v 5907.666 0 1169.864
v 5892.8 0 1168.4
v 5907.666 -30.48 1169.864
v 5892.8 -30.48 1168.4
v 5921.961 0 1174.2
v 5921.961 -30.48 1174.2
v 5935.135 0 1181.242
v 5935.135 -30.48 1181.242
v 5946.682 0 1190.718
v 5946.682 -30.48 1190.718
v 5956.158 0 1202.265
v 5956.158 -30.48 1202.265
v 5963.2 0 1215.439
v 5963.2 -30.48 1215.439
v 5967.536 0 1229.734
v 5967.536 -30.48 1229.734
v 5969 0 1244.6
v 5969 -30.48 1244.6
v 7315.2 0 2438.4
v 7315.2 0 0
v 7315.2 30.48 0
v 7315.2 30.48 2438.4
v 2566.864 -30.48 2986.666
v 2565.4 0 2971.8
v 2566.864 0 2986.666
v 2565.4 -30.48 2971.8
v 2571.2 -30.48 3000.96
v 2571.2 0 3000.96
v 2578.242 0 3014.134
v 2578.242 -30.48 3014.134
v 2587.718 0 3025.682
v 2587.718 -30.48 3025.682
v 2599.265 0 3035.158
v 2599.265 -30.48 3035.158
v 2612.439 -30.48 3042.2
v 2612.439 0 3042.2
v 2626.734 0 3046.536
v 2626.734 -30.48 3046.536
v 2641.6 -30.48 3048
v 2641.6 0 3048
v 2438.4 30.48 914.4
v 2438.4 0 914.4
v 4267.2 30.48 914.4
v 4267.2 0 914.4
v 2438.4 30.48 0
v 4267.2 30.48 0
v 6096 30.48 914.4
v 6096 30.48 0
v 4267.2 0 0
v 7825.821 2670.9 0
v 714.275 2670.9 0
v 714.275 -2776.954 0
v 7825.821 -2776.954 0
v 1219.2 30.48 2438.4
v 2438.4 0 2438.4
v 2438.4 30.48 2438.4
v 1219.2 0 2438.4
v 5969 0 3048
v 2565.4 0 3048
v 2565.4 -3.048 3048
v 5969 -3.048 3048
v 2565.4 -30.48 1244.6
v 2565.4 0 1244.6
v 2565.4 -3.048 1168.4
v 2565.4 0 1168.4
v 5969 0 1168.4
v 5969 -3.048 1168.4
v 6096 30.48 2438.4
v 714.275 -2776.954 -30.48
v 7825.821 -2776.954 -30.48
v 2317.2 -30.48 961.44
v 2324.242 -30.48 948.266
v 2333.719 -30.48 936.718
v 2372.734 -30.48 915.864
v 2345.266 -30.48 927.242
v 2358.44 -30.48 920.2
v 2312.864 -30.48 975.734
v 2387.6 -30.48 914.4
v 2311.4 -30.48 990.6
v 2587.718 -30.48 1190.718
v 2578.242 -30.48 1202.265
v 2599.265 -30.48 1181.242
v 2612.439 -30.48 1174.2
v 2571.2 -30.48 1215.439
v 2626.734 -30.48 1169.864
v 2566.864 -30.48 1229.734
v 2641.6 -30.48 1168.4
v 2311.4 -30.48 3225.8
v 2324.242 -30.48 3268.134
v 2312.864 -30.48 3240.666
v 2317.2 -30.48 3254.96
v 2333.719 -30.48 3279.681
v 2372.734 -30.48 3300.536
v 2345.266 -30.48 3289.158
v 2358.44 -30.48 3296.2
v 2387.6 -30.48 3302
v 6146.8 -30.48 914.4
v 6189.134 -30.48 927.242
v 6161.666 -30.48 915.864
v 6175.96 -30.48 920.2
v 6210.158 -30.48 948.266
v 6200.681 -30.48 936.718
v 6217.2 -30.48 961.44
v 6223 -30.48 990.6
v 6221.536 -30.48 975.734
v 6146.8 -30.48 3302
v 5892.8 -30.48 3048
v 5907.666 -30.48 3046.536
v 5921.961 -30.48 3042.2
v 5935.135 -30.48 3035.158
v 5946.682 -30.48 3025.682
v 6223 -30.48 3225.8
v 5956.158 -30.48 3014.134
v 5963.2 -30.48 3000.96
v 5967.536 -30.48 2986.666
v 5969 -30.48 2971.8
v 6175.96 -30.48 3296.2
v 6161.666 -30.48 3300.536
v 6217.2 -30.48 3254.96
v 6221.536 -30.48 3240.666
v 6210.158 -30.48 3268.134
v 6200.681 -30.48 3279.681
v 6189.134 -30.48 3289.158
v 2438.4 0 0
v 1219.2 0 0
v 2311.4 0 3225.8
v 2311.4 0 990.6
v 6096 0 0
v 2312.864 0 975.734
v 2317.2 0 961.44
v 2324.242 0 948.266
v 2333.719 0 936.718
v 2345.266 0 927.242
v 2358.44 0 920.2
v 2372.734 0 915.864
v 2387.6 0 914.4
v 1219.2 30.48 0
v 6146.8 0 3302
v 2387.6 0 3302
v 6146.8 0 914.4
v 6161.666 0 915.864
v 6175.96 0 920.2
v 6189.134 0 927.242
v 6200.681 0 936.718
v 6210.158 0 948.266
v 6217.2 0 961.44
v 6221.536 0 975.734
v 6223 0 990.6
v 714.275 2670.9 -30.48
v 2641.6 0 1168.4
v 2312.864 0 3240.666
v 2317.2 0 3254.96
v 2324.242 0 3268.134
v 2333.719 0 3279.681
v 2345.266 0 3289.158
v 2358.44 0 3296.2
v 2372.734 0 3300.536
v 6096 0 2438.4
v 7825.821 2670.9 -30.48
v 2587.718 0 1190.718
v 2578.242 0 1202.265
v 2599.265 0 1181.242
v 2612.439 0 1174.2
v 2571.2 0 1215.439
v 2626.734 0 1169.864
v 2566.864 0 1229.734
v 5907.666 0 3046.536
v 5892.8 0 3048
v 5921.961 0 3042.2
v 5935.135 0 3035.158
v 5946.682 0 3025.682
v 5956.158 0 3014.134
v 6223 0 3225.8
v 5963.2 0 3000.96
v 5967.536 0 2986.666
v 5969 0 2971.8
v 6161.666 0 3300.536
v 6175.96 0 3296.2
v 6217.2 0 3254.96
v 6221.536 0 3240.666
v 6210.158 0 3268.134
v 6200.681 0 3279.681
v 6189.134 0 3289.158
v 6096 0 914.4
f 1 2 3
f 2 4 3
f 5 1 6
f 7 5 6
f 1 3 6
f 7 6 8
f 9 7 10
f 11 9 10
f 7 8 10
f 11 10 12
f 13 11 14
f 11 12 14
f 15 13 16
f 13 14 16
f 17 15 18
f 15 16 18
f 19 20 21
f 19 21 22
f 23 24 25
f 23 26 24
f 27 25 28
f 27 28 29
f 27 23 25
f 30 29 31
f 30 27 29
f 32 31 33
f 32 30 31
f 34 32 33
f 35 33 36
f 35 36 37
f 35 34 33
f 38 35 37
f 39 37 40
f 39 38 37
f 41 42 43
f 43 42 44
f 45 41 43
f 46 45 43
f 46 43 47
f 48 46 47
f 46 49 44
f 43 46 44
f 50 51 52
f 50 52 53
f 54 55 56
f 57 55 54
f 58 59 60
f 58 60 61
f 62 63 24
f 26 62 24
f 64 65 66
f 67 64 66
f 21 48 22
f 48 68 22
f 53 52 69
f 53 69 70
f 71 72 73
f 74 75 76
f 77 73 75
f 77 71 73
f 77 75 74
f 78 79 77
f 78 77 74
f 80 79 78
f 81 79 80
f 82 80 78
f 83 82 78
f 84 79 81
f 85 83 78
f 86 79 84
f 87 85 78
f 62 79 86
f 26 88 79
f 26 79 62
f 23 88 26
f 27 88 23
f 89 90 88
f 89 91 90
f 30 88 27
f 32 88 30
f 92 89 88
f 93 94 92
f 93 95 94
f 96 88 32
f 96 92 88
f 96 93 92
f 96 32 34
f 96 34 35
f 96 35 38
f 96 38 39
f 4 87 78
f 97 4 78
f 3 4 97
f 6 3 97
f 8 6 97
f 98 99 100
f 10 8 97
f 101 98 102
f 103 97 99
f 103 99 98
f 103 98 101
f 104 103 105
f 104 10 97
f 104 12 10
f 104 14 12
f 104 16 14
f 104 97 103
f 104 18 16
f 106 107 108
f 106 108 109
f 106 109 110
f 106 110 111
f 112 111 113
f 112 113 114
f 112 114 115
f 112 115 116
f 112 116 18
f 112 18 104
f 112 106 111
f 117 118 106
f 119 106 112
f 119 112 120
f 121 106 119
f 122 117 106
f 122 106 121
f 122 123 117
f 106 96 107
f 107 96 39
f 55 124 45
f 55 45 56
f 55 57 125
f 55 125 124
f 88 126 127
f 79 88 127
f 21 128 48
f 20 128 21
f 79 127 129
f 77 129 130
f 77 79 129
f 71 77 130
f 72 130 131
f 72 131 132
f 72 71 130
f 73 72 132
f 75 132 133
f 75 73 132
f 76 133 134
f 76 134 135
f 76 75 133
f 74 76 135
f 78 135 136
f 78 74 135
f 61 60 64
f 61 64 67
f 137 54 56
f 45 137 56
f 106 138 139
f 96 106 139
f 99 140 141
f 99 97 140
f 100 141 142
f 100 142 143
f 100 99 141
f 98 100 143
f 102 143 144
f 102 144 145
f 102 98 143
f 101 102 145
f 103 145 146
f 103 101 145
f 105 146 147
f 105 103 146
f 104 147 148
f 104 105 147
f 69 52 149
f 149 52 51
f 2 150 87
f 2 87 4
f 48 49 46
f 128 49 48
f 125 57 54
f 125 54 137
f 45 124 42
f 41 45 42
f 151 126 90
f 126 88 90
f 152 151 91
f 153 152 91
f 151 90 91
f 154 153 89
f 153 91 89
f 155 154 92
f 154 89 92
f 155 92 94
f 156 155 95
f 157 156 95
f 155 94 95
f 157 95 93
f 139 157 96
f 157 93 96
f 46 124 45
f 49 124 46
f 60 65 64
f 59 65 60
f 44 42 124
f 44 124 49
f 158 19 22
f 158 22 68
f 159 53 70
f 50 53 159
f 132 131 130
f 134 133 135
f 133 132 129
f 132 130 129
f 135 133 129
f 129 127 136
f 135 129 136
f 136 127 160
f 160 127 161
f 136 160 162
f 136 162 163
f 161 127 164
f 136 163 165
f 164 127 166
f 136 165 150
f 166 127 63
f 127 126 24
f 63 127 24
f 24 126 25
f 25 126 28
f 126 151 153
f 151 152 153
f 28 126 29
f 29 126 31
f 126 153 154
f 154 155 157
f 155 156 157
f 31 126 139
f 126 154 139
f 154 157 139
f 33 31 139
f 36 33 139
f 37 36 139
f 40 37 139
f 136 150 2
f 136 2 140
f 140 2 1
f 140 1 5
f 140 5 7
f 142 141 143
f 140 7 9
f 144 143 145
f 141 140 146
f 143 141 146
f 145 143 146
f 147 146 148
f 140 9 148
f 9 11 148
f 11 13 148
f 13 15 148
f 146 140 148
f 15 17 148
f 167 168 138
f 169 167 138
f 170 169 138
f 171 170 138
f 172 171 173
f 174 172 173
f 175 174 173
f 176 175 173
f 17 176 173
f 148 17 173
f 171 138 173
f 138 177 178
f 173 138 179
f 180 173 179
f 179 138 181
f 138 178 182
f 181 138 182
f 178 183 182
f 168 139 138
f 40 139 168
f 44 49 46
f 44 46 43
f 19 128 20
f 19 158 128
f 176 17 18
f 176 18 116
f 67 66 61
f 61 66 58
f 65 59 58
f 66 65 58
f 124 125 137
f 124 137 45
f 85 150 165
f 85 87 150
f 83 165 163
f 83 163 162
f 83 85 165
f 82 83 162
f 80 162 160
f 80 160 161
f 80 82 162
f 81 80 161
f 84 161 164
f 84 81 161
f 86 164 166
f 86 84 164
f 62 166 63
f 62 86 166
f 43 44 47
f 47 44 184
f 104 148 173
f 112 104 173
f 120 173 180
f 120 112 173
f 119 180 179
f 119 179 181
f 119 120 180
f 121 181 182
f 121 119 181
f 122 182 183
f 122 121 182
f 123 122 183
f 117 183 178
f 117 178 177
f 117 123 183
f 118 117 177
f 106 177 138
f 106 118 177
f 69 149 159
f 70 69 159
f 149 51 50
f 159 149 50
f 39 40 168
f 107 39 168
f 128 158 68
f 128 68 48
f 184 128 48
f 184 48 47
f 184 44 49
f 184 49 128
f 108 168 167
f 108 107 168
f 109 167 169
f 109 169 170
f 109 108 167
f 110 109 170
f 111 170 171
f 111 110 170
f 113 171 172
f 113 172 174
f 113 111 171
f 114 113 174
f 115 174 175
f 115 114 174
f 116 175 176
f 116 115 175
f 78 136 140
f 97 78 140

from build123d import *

# Parameters (mm, degrees)
F0_W     = 1219.2
F0_H     = 2438.4
F1_DEPTH = 30.48
F0_W_2   = 1828.8
F0_H_2   = 914.4
F0_W_3   = 126.9999492
F0_H_3   = 1524
F2_DEPTH = 30.48
F0_W_4   = 3403.6001016
F0_H_4   = 1879.6001016
F3_DEPTH = 30.48
F4_DEPTH = 3.048
F5_R     = 76.2
F6_W     = 7111.5454435349
F6_H     = 5447.8538036346
F7_DEPTH = 30.48


with BuildPart() as f1:
    # F0 (on Front) → F1 (new body)
    with BuildSketch(Plane.XZ):
        with Locations((609.6, 1219.2)):
            Rectangle(F0_W, F0_H)
    extrude(amount=-F1_DEPTH)


with BuildPart() as f1b:
    # F0 (on Front) → F1, piece 2 (new body)
    with BuildSketch(Plane.XZ):
        with Locations((3352.8, 457.2)):
            Rectangle(F0_W_2, F0_H_2)
    extrude(amount=-F1_DEPTH)


with BuildPart() as f1c:
    # F0 (on Front) → F1, piece 3 (new body)
    with BuildSketch(Plane.XZ):
        Polygon((6096, 914.4), (6096, 0), (7315.2, 0), (7315.2, 2438.4), (6222.9999492, 2438.4), (6222.9999492, 914.4), align=None)
        with Locations((6159.4999746, 1676.4)):
            Rectangle(F0_W_3, F0_H_3)
    extrude(amount=-F1_DEPTH)


with BuildPart() as f2:
    # F0 (on Front) → F2 (new body)
    with BuildSketch(Plane.XZ):
        Polygon((1219.2, 2438.4), (1219.2, 0), (2438.4, 0), (2438.4, 914.4), (2311.4000508, 914.4), (2311.4000508, 2438.4), align=None)
        with Locations((2374.9000254, 1676.4)):
            Rectangle(F0_W_3, F0_H_3)
    extrude(amount=-F2_DEPTH)


with BuildPart() as f2b:
    # F0 (on Front) → F2, piece 2 (new body)
    with BuildSketch(Plane.XZ):
        with Locations((5181.6, 457.2)):
            Rectangle(F0_W_2, F0_H_2)
    extrude(amount=-F2_DEPTH)


with BuildPart() as f2c:
    # F0 (on Front) → F2, piece 3 (new body)
    with BuildSketch(Plane.XZ):
        with Locations((7924.8, 1219.2)):
            Rectangle(F0_W, F0_H)
    extrude(amount=-F2_DEPTH)


with BuildPart() as f3:
    # F0 (on Front) → F3 (new body)
    with BuildSketch(Plane.XZ):
        Polygon((2311.4000508, 3301.9998984), (2311.4000508, 2438.4), (2438.4, 2438.4), (2438.4, 914.4), (4267.2, 914.4), (6096, 914.4), (6096, 2438.4), (6222.9999492, 2438.4), (6222.9999492, 3301.9998984), align=None)
        with Locations((4267.2, 2108.1999492)):
            Rectangle(F0_W_4, F0_H_4, mode=Mode.SUBTRACT)
        with Locations((2374.9000254, 1676.4)):
            Rectangle(F0_W_3, F0_H_3)
        with Locations((6159.4999746, 1676.4)):
            Rectangle(F0_W_3, F0_H_3)
    extrude(amount=F3_DEPTH)

    # F5
    f5_edges = [f3.edges().sort_by_distance(p)[0] for p in [
        (2311.400051, -15.24, 3301.999898),
        (2565.399949, -15.24, 3048),
        (2311.400051, -15.24, 914.4),
        (2565.399949, -15.24, 1168.399898),
        (6222.999949, -15.24, 914.4),
        (5969.000051, -15.24, 1168.399898),
        (6222.999949, -15.24, 3301.999898),
        (5969.000051, -15.24, 3048),
    ]]
    fillet(f5_edges, radius=F5_R)


with BuildPart() as f4:
    # F0 (on Front) → F4 (new body)
    with BuildSketch(Plane.XZ):
        with Locations((4267.2, 2108.1999492)):
            Rectangle(F0_W_4, F0_H_4)
    extrude(amount=F4_DEPTH)


with BuildPart() as f7:
    # F6 (on Top) → F7 (new body)
    with BuildSketch(Plane.XY):
        with Locations((4270.0482010841, -53.0272722244)):
            Rectangle(F6_W, F6_H)
    extrude(amount=-F7_DEPTH)


solid = Compound([f1b.part, f1c.part, f2.part, f2b.part, f3.part, f4.part, f7.part])
